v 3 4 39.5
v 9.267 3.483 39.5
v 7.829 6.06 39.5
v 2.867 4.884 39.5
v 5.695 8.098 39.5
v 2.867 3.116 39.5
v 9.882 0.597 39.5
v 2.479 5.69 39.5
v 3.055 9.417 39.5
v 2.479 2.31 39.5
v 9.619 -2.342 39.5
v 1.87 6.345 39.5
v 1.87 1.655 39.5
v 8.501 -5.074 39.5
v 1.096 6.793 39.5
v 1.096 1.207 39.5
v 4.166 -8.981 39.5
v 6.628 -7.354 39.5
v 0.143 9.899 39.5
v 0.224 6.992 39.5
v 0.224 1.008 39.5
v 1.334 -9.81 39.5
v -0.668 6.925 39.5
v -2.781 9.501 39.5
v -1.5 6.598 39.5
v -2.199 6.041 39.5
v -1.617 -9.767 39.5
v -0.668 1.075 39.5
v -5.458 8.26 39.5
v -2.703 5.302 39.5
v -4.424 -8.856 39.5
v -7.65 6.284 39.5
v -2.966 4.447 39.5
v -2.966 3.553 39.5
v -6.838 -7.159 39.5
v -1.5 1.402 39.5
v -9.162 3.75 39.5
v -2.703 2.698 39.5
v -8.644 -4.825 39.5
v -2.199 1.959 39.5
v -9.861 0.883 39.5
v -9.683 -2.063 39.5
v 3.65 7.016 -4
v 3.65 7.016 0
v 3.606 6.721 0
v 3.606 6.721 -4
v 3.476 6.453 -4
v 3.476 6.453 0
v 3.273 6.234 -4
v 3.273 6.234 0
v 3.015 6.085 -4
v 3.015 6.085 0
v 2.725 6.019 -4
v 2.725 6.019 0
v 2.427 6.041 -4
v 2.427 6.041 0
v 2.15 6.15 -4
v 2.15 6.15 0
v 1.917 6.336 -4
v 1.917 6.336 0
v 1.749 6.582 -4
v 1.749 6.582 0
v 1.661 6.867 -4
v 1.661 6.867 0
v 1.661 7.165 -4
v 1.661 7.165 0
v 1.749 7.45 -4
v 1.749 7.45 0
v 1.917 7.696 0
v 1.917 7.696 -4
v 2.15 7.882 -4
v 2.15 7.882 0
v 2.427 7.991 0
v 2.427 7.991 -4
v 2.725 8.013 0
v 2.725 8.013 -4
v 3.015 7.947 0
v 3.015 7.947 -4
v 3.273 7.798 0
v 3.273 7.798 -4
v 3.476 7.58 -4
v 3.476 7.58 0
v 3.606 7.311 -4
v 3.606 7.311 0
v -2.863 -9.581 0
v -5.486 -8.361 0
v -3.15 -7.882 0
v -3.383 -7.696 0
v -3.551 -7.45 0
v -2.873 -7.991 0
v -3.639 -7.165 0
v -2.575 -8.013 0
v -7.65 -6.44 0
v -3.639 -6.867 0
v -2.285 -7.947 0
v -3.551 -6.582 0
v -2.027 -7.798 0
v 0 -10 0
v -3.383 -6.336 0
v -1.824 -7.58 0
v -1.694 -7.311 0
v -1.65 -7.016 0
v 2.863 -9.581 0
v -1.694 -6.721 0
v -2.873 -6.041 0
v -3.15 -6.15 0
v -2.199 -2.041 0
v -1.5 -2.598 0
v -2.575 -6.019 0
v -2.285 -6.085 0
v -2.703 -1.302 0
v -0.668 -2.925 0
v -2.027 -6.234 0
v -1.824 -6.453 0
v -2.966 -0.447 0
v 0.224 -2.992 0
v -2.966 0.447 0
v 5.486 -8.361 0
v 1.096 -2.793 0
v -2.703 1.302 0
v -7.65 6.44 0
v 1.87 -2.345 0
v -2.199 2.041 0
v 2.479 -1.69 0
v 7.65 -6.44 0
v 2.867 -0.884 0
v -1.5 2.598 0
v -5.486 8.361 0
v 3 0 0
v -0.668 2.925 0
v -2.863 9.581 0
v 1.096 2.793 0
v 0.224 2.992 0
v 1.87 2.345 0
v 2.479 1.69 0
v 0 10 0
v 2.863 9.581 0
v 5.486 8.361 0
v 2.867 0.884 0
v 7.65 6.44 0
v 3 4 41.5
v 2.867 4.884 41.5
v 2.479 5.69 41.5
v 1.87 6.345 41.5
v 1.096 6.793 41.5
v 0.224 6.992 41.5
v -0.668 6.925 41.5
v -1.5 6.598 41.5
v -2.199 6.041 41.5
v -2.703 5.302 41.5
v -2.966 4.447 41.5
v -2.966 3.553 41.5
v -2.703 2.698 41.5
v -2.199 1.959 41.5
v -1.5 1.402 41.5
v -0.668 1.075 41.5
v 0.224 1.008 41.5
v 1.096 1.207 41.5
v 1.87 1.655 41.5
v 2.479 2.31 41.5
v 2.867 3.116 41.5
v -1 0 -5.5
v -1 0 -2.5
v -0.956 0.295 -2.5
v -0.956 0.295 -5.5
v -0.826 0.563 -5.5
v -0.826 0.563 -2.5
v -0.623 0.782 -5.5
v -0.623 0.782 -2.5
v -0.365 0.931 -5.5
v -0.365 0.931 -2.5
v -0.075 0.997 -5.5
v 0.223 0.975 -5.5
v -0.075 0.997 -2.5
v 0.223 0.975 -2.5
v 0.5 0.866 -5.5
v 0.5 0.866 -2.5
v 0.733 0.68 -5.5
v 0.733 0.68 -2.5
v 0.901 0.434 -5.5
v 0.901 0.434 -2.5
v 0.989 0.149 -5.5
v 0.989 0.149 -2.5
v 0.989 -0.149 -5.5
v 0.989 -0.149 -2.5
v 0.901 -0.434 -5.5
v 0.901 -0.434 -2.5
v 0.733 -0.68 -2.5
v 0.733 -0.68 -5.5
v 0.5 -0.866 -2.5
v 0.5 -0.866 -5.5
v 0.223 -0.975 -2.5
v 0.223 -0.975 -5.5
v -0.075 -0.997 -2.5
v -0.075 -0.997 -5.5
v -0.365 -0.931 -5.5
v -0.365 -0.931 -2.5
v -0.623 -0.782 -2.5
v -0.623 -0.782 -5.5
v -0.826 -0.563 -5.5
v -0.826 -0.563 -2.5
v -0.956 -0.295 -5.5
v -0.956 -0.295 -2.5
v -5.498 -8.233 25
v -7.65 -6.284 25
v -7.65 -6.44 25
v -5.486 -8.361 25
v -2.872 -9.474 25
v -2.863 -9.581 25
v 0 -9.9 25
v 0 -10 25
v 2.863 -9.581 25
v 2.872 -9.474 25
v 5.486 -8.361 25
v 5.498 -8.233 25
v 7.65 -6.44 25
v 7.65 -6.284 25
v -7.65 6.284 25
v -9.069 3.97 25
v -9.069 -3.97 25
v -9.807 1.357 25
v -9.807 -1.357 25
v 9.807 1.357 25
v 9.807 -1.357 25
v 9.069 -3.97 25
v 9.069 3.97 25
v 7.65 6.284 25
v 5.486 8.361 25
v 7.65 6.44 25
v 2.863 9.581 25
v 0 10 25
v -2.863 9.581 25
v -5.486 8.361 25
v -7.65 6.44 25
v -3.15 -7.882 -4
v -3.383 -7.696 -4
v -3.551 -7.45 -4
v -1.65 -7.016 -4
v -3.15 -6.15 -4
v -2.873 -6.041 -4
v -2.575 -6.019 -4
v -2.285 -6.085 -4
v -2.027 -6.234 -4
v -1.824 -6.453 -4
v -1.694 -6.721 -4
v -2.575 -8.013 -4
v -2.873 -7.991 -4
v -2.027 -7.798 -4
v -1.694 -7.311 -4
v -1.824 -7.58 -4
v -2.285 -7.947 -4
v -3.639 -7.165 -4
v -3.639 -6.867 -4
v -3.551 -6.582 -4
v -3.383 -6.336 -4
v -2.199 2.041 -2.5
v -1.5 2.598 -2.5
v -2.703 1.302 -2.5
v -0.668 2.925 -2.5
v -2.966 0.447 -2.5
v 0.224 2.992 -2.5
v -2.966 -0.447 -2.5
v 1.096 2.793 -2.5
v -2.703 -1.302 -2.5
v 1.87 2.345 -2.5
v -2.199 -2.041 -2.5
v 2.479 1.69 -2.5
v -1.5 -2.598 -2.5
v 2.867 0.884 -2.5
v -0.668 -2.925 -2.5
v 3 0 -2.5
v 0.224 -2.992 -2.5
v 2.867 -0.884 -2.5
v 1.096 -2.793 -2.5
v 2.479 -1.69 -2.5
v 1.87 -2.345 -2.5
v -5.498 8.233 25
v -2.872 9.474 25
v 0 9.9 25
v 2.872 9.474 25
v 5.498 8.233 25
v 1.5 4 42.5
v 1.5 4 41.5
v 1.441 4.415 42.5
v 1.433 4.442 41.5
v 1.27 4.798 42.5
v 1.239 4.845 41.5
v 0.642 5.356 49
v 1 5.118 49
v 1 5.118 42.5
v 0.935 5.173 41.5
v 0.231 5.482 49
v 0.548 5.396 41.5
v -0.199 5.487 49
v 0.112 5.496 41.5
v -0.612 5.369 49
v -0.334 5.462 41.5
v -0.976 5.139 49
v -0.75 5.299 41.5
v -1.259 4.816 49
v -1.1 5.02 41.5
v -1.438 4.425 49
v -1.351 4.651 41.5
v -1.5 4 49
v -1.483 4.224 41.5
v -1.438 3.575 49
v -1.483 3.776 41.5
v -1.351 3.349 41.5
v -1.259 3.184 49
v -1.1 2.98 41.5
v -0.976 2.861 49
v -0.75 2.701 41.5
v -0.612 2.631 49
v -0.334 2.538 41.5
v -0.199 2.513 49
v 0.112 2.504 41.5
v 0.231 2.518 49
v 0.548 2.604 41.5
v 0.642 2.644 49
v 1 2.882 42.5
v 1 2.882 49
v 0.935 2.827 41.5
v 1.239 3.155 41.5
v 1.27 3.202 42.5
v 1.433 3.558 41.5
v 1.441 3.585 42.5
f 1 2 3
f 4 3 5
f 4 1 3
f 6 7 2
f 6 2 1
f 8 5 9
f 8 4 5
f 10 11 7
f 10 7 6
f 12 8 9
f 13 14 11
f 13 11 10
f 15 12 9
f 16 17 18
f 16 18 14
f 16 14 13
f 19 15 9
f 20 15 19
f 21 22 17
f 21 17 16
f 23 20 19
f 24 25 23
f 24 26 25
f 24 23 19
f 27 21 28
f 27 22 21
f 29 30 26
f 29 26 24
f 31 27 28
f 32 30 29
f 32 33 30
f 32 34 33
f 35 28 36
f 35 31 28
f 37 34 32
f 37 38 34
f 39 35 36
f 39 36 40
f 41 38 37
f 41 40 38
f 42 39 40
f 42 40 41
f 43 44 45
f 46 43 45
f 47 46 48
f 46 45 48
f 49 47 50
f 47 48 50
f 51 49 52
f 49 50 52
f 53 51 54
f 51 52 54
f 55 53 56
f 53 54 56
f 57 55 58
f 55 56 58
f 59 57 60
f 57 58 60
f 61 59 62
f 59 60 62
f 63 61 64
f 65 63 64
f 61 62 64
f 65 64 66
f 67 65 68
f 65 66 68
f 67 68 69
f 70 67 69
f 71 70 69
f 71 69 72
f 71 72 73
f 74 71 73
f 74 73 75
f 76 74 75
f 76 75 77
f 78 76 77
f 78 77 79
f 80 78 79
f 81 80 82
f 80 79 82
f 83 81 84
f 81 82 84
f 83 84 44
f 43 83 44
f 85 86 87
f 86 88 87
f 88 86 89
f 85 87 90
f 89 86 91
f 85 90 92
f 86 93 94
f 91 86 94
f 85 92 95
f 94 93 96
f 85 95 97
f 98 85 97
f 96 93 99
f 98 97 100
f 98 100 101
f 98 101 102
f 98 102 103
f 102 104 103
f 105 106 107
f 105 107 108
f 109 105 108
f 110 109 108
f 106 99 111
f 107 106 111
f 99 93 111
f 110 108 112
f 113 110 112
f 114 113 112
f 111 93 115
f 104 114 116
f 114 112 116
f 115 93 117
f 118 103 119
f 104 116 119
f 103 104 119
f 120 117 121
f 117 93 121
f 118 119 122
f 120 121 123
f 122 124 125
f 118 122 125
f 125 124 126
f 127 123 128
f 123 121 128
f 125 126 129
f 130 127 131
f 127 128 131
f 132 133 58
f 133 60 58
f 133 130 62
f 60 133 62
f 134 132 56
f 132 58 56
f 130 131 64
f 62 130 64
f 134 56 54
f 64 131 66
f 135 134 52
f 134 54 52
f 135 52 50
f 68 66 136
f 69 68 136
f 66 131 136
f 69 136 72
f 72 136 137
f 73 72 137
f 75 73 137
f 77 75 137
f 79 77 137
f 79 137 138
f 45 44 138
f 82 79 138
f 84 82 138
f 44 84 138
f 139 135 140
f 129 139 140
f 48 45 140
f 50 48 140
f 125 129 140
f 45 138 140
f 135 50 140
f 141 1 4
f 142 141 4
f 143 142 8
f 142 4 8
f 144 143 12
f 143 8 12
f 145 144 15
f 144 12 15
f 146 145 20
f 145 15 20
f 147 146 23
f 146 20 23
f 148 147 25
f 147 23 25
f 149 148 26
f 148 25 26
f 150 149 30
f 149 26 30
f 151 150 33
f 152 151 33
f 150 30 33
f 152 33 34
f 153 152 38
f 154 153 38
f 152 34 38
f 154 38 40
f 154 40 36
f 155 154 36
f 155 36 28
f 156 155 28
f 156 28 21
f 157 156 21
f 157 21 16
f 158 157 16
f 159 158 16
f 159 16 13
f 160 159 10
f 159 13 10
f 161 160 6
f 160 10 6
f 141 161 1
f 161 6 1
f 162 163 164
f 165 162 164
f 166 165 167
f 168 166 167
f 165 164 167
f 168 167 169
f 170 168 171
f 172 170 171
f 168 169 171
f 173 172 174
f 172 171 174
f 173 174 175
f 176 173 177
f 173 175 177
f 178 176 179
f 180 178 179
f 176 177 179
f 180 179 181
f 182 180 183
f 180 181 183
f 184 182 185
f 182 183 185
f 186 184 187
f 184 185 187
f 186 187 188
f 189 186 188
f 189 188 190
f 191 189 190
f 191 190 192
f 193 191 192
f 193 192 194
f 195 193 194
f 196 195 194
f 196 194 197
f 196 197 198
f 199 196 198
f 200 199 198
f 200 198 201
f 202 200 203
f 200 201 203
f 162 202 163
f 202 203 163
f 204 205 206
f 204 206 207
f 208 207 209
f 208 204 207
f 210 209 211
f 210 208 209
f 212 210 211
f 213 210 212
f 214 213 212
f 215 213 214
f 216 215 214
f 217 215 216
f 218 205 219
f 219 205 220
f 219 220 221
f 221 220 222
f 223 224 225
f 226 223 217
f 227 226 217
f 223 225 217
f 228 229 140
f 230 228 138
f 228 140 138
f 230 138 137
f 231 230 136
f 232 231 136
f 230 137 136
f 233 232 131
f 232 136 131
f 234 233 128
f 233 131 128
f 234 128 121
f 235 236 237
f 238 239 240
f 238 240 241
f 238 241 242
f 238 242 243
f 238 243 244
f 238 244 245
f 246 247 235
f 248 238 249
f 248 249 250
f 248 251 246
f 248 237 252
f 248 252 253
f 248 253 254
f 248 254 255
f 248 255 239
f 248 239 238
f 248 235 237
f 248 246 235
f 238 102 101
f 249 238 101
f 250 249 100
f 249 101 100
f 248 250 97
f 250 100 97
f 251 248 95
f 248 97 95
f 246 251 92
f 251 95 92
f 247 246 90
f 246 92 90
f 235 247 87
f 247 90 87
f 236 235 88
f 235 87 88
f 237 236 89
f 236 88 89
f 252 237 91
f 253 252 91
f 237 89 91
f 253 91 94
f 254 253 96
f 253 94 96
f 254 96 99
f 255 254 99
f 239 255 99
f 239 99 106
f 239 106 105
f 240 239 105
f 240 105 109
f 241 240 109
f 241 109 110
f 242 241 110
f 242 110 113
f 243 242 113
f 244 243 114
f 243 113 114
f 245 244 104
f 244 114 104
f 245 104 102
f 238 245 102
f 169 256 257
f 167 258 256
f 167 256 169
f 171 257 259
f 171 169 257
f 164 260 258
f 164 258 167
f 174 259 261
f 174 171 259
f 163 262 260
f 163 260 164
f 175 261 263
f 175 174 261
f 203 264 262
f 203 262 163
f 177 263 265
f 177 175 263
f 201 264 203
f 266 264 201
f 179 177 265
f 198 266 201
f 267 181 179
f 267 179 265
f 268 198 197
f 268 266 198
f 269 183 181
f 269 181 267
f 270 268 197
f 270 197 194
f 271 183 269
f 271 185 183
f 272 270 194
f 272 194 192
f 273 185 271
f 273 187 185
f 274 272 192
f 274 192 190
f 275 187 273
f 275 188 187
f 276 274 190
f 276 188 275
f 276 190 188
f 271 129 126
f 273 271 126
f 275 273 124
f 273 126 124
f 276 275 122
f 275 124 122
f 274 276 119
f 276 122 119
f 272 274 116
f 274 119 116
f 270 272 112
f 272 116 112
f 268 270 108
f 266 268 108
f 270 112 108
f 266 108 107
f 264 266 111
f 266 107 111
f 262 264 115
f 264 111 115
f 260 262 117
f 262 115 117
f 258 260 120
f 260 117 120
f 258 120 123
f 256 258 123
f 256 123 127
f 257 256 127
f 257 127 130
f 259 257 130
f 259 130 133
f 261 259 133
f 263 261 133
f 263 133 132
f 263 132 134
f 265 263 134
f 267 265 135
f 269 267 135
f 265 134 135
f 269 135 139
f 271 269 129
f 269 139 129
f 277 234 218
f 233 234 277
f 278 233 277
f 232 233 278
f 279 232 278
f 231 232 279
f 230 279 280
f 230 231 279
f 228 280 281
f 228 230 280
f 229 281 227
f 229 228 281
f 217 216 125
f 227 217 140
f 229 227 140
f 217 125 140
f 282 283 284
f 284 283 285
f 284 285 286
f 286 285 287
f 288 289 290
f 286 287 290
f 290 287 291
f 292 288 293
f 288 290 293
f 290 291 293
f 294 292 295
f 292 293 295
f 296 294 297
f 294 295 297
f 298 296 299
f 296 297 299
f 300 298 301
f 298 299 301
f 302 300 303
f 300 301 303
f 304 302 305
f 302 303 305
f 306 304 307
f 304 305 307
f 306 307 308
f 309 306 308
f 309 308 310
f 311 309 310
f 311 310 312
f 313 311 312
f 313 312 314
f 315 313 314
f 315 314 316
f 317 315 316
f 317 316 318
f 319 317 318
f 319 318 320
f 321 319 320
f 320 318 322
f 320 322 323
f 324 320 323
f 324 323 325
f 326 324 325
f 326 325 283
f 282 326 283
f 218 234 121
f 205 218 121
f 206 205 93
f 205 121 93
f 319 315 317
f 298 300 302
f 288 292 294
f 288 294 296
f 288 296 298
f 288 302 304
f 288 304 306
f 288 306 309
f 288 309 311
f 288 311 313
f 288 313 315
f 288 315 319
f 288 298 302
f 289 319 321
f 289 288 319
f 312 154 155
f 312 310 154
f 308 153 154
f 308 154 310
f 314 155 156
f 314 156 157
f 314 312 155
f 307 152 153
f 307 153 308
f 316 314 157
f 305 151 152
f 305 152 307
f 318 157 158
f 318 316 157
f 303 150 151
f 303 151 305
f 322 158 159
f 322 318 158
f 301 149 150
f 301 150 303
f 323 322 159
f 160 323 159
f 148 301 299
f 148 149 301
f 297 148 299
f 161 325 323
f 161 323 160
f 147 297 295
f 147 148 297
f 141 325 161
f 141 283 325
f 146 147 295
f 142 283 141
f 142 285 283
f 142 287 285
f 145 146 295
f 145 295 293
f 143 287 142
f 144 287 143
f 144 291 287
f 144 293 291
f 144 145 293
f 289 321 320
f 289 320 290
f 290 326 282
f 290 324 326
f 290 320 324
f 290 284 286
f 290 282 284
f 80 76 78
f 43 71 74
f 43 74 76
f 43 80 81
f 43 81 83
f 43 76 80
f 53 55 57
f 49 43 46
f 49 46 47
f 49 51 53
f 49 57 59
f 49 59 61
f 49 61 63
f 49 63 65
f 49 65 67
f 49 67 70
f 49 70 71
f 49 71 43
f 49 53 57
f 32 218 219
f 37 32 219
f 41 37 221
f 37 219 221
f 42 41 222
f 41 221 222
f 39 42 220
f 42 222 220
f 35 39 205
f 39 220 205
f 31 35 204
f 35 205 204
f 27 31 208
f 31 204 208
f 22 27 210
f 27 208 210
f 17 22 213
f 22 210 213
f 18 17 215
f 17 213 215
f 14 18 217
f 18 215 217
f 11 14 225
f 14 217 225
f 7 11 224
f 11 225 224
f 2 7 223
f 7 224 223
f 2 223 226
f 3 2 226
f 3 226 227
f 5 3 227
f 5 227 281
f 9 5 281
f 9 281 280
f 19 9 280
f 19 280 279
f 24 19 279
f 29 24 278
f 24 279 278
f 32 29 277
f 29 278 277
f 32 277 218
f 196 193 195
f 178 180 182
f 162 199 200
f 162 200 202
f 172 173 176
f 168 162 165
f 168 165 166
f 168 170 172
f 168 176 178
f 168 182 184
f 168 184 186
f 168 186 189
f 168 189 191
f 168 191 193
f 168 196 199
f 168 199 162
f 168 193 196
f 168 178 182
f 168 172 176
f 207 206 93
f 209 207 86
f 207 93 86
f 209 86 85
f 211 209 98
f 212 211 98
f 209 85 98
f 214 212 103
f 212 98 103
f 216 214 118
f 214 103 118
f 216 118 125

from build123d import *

# Parameters (mm, degrees)
EXTRUDE1_DEPTH = 25
SKETCH2_R      = 9.9
EXTRUDE2_DEPTH = 14.5
SKETCH3_R      = 3
EXTRUDE3_DEPTH = 2.5
SKETCH4_R      = 1
EXTRUDE4_DEPTH = 3
SKETCH5_R      = 1
EXTRUDE5_DEPTH = 4
SKETCH6_R      = 3
EXTRUDE6_DEPTH = 2
SKETCH7_R      = 1.5
EXTRUDE7_DEPTH = 7.5
SKETCH8_W      = 0.5
SKETCH8_H      = 2.236067978
EXTRUDE8_DEPTH = 6.5


with BuildPart() as part:
    # Sketch1 → Extrude1 (new body)
    with BuildSketch(Plane.XY):
        with BuildLine():
            Line((-7.65, 6.440302788), (-7.65, -6.440302788))
            ThreePointArc((-7.65, -6.440302788), (0, -10), (7.65, -6.440302788))
            Line((7.65, -6.440302788), (7.65, 6.440302788))
            ThreePointArc((7.65, 6.440302788), (0, 10), (-7.65, 6.440302788))
        make_face()
    extrude(amount=EXTRUDE1_DEPTH)

    # Sketch2 → Extrude2 (add)
    with BuildSketch(Plane.XY.offset(25)):
        with Locations(Location((0, 0, 0), (0, 0, 140.599431246))):
            Circle(SKETCH2_R)
    extrude(amount=EXTRUDE2_DEPTH)

    # Sketch3 → Extrude3 (add)
    with BuildSketch(Plane(origin=(0, 0, 0), x_dir=(-1, 0, 0), z_dir=(0, 0, -1))):
        with Locations(Location((0, 0, 0), (0, 0, 180))):
            Circle(SKETCH3_R)
    extrude(amount=EXTRUDE3_DEPTH)

    # Sketch4 → Extrude4 (add)
    with BuildSketch(Plane(origin=(0, 0, -2.5), x_dir=(-1, 0, 0), z_dir=(0, 0, -1))):
        Circle(SKETCH4_R)
    extrude(amount=EXTRUDE4_DEPTH)

    # Sketch5 → Extrude5 (add)
    with BuildSketch(Plane(origin=(0, 0, 0), x_dir=(-1, 0, 0), z_dir=(0, 0, -1))):
        with Locations(Location((-2.65, 7.016231182, 0), (0, 0, 180))):
            Circle(SKETCH5_R)
        with Locations(Location((2.65, -7.016231182, 0), (0, 0, 180))):
            Circle(SKETCH5_R)
    extrude(amount=EXTRUDE5_DEPTH)

    # Sketch6 → Extrude6 (add)
    with BuildSketch(Plane.XY.offset(39.5)):
        with Locations((0, 4)):
            Circle(SKETCH6_R)
    extrude(amount=EXTRUDE6_DEPTH)

    # Sketch7 → Extrude7 (add)
    with BuildSketch(Plane.XY.offset(41.5)):
        with Locations((0, 4)):
            Circle(SKETCH7_R)
    extrude(amount=EXTRUDE7_DEPTH)

    # Sketch8 → Extrude8 (cut)
    with BuildSketch(Plane.XY.offset(49)):
        with Locations((1.25, 4)):
            Rectangle(SKETCH8_W, SKETCH8_H)
    extrude(amount=-EXTRUDE8_DEPTH, mode=Mode.SUBTRACT)


solid = part.part
